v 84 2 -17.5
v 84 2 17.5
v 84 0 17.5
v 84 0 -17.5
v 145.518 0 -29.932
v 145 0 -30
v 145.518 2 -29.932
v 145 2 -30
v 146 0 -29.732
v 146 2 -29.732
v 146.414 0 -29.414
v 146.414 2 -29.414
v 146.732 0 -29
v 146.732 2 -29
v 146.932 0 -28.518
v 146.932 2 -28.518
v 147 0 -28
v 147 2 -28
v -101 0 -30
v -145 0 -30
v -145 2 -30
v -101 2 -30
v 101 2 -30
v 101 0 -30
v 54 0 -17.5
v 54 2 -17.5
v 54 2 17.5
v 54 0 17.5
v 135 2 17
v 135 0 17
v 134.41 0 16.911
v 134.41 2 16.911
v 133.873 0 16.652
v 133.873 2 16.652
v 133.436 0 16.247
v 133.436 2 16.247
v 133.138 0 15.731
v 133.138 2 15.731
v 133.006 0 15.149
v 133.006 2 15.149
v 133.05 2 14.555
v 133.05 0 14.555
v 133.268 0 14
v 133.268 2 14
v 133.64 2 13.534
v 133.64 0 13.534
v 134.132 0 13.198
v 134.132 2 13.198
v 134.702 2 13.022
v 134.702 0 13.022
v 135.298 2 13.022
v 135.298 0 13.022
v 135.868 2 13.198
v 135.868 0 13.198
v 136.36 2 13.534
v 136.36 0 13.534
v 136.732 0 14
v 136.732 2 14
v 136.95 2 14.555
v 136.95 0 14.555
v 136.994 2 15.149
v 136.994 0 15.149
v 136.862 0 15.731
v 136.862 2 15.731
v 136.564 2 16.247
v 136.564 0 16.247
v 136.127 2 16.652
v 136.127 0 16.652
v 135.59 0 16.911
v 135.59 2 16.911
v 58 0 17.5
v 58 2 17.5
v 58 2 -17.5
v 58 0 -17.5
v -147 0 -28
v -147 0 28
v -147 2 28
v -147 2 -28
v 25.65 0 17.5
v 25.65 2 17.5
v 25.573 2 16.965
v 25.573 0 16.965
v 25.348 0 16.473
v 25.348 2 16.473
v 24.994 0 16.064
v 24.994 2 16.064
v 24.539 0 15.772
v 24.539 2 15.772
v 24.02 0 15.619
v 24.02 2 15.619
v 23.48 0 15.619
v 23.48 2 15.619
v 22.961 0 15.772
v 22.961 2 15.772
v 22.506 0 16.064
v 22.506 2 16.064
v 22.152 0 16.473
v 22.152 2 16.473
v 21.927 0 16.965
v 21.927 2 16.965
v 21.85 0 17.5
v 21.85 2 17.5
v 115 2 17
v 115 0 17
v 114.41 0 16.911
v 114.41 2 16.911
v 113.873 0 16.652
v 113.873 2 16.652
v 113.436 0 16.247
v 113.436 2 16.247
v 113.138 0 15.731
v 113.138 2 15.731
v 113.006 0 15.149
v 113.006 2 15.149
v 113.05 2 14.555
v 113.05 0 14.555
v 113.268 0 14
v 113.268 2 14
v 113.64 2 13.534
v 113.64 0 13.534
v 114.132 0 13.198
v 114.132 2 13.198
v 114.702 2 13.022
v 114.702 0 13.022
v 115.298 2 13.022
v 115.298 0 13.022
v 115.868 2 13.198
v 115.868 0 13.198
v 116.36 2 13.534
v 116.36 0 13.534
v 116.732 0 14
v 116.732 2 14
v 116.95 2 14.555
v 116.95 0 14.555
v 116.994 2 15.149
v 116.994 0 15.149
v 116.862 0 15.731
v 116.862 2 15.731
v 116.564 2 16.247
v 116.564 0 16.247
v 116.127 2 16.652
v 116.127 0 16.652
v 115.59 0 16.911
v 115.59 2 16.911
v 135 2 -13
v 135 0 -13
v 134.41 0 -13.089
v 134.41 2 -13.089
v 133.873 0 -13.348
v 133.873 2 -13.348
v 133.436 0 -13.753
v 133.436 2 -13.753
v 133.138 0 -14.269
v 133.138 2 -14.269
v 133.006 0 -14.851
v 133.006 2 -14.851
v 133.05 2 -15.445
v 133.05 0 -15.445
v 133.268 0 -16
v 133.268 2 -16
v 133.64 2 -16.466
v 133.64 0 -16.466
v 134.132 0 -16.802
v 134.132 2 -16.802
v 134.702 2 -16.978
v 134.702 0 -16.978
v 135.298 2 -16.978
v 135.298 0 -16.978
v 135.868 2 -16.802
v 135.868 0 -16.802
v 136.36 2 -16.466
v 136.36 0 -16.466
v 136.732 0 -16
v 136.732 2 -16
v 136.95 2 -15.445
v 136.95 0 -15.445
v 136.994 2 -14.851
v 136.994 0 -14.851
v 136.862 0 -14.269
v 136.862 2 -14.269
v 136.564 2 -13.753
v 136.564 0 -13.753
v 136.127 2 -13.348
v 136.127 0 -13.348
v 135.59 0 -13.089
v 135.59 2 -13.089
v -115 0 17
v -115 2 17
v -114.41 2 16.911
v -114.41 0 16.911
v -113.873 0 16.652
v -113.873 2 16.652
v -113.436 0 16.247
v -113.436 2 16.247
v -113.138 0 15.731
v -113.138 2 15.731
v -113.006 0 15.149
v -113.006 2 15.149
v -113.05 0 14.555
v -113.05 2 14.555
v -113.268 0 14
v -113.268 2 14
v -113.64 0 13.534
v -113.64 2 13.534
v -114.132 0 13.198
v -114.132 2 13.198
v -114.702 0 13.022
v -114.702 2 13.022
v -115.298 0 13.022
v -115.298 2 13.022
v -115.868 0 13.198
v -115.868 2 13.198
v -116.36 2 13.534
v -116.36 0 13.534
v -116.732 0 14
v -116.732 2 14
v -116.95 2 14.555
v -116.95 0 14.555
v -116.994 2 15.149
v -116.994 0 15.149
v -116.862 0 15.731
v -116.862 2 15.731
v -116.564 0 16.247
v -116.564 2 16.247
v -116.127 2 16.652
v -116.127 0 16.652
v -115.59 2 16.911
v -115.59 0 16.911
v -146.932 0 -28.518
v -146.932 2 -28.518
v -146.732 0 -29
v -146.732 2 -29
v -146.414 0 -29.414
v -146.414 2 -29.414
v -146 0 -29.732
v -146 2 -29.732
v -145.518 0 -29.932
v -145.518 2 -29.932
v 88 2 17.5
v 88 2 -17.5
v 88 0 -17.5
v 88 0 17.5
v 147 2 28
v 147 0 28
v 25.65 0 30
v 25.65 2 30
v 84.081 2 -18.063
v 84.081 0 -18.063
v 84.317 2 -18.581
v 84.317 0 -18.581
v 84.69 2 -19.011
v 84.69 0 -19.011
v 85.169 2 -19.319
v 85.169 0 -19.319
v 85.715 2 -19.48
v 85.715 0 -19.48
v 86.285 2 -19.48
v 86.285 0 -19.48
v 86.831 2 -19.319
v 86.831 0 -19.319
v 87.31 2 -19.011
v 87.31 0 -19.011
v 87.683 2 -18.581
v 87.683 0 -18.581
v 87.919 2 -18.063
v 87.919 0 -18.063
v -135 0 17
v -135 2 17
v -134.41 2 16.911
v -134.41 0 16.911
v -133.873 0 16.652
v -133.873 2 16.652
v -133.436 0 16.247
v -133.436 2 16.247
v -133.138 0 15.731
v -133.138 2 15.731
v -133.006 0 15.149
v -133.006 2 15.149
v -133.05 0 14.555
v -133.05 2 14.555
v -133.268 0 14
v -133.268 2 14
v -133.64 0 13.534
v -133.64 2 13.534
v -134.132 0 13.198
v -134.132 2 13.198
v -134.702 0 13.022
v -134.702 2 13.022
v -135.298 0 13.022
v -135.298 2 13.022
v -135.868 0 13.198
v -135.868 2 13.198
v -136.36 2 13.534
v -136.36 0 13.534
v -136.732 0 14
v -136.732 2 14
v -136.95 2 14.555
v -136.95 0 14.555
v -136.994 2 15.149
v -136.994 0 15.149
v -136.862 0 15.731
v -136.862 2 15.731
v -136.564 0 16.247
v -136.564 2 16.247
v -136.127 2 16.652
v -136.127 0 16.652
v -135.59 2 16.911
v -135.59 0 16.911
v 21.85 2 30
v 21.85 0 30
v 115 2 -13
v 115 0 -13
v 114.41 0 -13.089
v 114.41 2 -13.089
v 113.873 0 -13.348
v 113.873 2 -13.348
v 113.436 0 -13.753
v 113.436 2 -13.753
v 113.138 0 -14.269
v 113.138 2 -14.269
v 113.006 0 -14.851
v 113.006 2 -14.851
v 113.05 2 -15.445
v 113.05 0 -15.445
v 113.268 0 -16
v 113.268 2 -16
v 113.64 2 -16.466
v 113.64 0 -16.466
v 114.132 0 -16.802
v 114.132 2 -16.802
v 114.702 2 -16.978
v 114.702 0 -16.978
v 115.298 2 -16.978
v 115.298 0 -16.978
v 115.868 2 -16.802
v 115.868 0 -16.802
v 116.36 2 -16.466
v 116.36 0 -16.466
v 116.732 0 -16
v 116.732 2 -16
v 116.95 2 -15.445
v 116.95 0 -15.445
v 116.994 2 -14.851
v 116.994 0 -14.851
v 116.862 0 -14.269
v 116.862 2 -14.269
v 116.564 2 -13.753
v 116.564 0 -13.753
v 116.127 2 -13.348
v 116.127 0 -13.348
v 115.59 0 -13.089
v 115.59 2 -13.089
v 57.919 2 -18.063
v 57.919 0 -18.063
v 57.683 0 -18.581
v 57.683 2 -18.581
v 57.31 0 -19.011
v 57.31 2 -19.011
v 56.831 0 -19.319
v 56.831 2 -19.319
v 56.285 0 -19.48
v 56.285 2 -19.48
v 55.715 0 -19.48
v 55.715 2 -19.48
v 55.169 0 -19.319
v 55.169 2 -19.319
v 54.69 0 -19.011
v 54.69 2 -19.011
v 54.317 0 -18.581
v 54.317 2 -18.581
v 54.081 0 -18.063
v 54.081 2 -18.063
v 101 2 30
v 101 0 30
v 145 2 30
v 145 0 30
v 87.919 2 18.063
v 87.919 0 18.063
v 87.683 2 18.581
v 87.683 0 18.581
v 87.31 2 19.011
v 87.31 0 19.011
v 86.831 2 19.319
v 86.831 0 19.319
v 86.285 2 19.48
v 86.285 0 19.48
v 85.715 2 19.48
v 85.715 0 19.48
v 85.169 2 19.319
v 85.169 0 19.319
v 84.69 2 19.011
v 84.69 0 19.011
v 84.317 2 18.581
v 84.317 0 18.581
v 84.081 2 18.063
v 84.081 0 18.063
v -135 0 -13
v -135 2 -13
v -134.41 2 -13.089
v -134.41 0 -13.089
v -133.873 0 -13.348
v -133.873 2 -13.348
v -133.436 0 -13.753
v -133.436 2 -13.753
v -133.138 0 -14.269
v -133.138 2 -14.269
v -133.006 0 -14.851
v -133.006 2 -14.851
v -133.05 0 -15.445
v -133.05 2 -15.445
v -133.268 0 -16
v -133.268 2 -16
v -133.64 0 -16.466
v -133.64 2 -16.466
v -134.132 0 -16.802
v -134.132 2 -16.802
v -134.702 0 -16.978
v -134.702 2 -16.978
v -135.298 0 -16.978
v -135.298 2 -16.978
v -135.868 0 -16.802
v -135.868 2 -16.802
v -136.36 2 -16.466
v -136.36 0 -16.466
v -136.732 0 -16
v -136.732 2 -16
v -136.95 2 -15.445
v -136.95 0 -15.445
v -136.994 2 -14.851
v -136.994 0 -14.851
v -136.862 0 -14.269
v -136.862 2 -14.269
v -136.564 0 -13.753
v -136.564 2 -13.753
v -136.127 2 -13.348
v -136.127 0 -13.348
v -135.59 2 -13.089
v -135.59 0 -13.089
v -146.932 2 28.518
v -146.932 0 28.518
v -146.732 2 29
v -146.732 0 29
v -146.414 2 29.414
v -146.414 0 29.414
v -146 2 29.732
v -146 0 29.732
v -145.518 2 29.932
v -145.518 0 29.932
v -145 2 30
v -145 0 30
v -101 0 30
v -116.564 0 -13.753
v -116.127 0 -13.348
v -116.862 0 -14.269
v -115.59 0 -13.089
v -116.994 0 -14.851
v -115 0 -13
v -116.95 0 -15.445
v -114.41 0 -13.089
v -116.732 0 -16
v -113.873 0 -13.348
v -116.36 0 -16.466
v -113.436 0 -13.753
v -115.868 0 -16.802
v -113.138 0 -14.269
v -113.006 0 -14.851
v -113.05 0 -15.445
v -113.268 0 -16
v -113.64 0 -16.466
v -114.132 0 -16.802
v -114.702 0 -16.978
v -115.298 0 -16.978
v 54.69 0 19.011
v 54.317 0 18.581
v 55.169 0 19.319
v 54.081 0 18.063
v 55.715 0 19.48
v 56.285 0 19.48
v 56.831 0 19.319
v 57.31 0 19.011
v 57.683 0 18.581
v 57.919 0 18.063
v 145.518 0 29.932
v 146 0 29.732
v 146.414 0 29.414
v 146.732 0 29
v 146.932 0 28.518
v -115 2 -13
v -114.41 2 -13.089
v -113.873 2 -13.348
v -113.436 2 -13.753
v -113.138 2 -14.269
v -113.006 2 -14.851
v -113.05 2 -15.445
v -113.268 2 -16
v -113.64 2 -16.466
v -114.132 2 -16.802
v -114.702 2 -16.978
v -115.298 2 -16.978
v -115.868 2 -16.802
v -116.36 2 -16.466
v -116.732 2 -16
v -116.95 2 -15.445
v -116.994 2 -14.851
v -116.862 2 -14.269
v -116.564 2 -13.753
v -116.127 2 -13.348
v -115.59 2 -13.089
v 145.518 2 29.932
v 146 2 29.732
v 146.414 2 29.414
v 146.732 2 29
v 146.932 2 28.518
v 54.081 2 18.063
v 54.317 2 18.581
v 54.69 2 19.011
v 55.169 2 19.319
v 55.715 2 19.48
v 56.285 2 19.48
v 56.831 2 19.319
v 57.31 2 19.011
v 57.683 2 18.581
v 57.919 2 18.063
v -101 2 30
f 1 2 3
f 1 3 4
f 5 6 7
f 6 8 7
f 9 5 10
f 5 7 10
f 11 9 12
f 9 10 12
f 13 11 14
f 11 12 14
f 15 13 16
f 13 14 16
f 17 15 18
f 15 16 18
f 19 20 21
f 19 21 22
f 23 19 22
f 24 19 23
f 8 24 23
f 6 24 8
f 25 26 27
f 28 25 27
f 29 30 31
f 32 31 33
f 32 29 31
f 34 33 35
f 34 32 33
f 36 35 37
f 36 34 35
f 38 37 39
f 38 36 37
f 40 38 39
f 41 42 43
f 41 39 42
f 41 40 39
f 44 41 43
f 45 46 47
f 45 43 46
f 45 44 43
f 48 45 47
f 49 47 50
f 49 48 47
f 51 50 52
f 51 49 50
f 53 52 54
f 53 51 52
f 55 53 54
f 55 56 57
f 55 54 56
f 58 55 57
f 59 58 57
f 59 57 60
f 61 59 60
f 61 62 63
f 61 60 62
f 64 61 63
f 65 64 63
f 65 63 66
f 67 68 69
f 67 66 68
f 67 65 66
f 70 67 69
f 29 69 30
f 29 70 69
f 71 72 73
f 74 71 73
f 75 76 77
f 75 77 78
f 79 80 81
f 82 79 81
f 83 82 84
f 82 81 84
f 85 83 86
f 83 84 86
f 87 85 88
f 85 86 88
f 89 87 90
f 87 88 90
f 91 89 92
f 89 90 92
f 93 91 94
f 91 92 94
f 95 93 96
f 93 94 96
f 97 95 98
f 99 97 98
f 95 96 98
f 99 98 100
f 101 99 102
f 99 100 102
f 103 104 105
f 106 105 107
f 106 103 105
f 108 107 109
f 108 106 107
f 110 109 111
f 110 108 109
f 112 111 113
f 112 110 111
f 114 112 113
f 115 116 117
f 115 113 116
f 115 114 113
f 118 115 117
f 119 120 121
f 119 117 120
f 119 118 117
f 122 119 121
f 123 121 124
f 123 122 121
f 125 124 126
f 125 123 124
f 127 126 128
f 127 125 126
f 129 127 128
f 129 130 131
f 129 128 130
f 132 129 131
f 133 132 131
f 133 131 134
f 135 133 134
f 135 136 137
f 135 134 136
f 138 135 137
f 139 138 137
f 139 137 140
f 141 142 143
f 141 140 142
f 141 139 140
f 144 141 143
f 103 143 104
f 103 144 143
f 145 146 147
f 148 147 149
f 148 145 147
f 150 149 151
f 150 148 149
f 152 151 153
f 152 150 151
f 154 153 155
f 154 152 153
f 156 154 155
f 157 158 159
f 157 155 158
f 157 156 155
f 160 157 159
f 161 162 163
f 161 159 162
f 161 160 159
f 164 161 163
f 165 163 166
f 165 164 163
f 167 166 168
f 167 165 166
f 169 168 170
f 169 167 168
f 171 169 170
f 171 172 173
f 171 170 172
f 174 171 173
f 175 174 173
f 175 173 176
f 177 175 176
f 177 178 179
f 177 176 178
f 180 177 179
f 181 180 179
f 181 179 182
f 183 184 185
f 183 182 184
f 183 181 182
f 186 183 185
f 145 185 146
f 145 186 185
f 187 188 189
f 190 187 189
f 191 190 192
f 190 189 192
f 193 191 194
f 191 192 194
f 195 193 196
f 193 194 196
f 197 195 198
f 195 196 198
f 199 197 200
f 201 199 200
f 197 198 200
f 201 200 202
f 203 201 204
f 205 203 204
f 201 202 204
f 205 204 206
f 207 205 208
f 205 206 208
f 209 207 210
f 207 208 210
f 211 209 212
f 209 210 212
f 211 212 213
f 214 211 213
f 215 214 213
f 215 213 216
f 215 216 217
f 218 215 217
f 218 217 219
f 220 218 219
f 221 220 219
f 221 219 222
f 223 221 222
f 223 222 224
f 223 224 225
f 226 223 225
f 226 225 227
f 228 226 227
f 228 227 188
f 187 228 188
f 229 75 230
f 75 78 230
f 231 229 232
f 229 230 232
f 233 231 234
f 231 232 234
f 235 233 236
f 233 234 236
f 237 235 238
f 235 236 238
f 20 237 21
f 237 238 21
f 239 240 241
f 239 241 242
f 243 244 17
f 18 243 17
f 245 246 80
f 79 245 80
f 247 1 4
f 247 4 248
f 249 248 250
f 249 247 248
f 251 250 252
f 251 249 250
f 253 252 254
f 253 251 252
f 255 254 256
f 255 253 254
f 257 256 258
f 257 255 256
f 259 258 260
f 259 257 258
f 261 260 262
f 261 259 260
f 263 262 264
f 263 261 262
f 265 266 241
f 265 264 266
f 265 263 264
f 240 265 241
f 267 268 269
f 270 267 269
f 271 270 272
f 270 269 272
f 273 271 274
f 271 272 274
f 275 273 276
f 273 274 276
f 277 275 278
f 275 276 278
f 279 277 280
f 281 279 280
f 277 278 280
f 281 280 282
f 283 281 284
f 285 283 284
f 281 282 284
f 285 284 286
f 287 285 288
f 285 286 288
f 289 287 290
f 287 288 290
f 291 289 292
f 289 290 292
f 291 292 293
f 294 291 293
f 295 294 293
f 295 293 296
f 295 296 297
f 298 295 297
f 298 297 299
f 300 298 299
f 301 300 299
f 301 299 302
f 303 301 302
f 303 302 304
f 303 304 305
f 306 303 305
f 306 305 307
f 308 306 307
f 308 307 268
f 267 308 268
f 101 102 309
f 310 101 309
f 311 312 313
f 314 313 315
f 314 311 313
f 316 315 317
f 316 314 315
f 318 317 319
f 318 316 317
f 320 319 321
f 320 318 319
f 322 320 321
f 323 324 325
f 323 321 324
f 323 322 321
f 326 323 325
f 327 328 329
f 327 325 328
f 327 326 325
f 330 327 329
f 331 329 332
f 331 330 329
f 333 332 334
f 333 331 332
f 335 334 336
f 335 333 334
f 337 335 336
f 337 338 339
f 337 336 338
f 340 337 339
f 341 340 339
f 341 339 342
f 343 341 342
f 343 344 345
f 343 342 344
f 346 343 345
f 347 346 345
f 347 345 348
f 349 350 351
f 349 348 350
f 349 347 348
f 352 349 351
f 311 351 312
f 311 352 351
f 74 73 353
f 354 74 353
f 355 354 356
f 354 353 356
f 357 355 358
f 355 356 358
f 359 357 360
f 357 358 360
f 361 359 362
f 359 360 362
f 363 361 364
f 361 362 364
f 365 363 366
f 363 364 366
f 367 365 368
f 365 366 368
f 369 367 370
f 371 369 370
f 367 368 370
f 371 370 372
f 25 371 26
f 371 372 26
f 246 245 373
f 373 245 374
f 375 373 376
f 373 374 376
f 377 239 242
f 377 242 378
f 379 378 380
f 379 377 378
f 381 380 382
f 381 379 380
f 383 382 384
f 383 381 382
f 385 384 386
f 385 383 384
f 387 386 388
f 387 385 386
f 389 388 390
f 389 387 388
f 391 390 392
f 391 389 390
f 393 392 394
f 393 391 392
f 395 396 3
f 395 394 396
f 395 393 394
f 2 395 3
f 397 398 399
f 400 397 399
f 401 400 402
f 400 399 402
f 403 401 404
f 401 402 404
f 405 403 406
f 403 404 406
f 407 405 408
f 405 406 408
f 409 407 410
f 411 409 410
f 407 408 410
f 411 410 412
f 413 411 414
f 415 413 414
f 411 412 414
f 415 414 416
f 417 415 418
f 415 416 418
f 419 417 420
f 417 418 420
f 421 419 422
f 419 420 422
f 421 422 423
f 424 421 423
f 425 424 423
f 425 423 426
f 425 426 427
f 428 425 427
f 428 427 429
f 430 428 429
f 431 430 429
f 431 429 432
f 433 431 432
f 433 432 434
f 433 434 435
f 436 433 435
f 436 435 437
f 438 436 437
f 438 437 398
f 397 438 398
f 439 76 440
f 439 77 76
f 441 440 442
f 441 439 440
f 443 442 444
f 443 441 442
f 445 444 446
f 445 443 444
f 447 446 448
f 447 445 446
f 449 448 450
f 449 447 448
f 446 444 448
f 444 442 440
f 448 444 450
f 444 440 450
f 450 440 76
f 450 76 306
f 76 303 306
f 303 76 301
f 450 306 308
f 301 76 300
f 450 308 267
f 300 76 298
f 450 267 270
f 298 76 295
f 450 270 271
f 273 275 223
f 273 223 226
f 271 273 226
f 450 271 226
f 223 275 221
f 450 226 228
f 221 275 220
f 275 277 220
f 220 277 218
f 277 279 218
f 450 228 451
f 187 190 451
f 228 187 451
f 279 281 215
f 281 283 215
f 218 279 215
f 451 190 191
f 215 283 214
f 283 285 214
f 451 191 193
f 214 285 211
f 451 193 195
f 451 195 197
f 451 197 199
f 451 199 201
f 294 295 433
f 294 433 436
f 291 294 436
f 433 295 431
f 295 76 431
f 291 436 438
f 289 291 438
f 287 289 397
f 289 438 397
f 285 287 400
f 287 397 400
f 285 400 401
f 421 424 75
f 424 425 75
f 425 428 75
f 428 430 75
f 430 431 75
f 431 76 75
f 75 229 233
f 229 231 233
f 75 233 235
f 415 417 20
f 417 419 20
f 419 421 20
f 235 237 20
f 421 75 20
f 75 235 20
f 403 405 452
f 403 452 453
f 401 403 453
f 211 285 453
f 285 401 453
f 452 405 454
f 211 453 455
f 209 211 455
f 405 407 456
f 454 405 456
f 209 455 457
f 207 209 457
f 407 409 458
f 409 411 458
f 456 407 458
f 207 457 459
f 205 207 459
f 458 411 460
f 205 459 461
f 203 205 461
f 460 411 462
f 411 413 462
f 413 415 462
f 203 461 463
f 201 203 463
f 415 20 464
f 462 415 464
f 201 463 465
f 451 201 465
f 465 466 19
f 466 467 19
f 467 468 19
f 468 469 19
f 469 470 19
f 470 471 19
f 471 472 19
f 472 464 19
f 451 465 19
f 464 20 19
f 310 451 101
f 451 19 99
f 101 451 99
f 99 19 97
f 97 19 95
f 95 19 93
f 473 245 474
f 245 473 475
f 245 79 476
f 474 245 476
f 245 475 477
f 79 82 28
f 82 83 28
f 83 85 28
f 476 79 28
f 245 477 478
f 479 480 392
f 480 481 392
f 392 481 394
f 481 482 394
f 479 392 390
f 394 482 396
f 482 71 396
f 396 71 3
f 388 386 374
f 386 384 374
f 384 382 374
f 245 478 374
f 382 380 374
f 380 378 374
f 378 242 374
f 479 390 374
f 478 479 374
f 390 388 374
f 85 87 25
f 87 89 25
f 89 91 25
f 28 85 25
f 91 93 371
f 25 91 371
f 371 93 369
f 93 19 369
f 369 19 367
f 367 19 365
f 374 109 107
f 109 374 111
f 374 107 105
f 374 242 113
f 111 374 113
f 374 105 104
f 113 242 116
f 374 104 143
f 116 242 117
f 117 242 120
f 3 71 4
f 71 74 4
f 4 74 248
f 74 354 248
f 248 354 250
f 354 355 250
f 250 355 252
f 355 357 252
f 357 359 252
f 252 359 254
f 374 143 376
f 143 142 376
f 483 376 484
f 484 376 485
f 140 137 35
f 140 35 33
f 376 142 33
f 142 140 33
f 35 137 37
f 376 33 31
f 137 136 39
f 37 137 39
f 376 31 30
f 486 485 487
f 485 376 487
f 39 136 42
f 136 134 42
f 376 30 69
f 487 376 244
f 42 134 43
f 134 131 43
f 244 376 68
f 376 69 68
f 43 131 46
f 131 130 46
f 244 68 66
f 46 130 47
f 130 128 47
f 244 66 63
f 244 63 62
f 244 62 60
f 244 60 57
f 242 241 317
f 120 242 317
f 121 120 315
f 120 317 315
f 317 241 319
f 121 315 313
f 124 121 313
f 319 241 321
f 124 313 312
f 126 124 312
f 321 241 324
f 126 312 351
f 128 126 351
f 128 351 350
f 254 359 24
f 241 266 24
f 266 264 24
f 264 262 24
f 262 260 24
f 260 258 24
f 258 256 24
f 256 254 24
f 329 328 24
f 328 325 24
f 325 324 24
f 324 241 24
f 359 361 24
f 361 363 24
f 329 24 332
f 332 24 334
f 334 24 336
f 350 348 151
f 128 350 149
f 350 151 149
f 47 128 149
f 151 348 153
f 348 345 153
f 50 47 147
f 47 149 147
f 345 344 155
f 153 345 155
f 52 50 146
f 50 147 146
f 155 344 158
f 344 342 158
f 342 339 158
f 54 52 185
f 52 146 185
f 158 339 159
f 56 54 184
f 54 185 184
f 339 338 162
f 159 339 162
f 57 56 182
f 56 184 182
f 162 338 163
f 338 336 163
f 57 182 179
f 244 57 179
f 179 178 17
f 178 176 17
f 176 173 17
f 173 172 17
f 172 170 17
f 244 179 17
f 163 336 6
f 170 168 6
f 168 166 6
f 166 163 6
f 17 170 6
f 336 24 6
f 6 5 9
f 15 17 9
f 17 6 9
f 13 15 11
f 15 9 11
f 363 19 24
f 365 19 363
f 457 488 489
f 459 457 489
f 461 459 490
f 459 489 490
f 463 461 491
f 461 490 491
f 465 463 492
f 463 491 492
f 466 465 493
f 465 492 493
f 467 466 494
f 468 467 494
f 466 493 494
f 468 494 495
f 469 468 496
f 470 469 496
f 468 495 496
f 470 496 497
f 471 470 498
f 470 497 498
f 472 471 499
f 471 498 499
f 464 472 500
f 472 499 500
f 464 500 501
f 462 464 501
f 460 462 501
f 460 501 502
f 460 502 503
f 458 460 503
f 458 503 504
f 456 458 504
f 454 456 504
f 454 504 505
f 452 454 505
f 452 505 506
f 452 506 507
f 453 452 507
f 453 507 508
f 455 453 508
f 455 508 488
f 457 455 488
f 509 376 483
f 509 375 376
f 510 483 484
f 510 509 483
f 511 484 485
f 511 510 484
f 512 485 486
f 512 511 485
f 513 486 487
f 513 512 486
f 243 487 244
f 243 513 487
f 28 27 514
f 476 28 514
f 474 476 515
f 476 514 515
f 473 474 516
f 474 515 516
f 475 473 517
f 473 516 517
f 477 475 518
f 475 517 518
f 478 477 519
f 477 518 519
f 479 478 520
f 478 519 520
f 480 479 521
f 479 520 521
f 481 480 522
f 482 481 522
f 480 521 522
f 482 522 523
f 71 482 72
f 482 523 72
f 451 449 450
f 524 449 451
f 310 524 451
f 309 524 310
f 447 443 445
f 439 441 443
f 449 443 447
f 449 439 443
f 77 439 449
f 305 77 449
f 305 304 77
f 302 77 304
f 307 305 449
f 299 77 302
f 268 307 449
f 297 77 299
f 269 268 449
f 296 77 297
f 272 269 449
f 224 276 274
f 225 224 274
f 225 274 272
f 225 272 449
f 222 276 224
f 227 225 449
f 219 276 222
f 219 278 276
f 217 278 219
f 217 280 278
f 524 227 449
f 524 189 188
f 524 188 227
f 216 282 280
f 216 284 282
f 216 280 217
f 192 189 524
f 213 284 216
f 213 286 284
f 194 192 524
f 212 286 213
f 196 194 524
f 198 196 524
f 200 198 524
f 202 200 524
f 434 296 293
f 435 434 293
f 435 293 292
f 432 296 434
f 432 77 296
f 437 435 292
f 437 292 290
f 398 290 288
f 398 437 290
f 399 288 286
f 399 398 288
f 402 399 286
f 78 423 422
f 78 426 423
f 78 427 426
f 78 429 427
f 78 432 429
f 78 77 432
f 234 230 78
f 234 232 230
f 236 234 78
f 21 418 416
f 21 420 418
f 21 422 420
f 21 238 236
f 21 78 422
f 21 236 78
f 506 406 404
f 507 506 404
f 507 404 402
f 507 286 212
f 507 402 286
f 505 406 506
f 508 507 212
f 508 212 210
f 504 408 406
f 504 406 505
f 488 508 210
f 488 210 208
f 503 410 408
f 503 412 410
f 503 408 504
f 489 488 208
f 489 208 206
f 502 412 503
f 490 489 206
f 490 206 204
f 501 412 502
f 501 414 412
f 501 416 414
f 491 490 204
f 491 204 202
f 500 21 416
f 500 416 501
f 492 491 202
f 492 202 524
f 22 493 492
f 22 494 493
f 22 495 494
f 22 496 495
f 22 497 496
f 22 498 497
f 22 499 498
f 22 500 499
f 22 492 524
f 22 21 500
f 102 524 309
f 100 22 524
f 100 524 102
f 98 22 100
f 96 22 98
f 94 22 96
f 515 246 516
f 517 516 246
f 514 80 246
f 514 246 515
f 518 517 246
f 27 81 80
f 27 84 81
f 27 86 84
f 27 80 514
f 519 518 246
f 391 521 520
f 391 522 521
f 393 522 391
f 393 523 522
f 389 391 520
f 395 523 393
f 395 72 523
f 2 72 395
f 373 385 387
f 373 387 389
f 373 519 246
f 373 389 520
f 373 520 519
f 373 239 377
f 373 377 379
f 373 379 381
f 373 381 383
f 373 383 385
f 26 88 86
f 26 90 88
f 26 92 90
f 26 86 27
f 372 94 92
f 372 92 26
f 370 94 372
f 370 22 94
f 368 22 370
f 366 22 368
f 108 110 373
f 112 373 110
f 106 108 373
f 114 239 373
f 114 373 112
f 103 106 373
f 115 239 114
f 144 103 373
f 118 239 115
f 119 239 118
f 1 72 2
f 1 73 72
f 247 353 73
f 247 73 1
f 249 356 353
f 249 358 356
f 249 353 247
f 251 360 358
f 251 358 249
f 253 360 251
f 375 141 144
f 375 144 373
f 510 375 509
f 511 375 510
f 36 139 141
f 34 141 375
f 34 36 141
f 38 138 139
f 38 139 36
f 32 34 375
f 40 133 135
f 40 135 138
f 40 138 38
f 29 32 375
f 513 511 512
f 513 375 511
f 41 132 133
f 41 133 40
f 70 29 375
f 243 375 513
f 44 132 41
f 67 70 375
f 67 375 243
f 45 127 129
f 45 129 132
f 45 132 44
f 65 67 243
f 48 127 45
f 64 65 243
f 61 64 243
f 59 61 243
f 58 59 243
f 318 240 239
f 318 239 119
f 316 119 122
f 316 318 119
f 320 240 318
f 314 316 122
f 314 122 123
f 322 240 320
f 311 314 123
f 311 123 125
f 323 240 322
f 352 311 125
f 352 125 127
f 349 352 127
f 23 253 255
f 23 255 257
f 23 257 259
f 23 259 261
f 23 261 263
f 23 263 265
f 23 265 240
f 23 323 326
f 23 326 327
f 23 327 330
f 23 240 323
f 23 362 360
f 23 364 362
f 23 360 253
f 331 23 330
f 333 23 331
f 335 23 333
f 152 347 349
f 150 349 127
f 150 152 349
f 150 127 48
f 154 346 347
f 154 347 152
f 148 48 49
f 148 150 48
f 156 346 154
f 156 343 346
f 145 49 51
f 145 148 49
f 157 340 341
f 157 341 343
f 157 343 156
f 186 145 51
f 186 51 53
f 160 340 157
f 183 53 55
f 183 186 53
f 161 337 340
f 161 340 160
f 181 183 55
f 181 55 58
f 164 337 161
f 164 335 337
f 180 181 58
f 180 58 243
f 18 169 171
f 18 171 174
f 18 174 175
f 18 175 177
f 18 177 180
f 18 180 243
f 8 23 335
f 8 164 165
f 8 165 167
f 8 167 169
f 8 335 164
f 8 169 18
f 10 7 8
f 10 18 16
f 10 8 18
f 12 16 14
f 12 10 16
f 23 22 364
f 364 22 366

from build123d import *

# Parameters (mm, degrees)
SKETCH1_W           = 47
SKETCH1_H           = 60
SKETCH1_W_2         = 140
SKETCH1_H_2         = 140
BOSS_EXTRUDE1_DEPTH = 2
SKETCH2_R           = 2
CUT_EXTRUDE1_DEPTH  = 10
CUT_EXTRUDE3_DEPTH  = 10
FILLET1_R           = 2
SKETCH12_W          = 218.916263912
SKETCH12_H          = 42.811459275
SKETCH12_H_2        = 41.263513939
CUT_EXTRUDE4_DEPTH  = 10


with BuildPart() as part:
    # Sketch1 → Boss-Extrude1 (new body)
    with BuildSketch(Plane(origin=(0, 0, 0), x_dir=(1, 0, 0), z_dir=(0, 1, 0))):
        with Locations((-123.5, 0)):
            Rectangle(SKETCH1_W, SKETCH1_H)
        Polygon((-100, 30), (-100, -30), (-70, -70), (-70, 70), align=None)
        Rectangle(SKETCH1_W_2, SKETCH1_H_2)
        Polygon((100, 30), (100, -30), (70, -70), (70, 70), align=None)
        with Locations((123.5, 0)):
            Rectangle(SKETCH1_W, SKETCH1_H)
    extrude(amount=BOSS_EXTRUDE1_DEPTH)

    # Sketch2 → Cut-Extrude1 (cut)
    with BuildSketch(Plane(origin=(0, 2, 0), x_dir=(1, 0, 0), z_dir=(0, 1, 0))):
        with Locations(Location((-135, 15, 0), (0, 0, 270))):
            Circle(SKETCH2_R)
        with Locations(Location((-115, 15, 0), (0, 0, 270))):
            Circle(SKETCH2_R)
        with Locations(Location((-135, -15, 0), (0, 0, 270))):
            Circle(SKETCH2_R)
        with Locations(Location((-115, -15, 0), (0, 0, 270))):
            Circle(SKETCH2_R)
    cut_extrude1 = extrude(amount=-CUT_EXTRUDE1_DEPTH, mode=Mode.SUBTRACT)

    # Mirror1: Cut-Extrude1 across plane
    add(cut_extrude1.mirror(Plane(origin=(0, 0, 0), x_dir=(0, 0, 1), z_dir=(1, 0, 0))), mode=Mode.SUBTRACT)

    # Sketch11 → Cut-Extrude3 (cut)
    with BuildSketch(Plane(origin=(0, 2, 0), x_dir=(1, 0, 0), z_dir=(0, 1, 0))):
        with BuildLine():
            Line((58, -17.5), (58, 17.5))
            ThreePointArc((58, 17.5), (56, 19.5), (54, 17.5))
            Line((54, 17.5), (54, -17.5))
            ThreePointArc((54, -17.5), (56, -19.5), (58, -17.5))
        make_face()
        with BuildLine():
            Line((84, -17.5), (84, 17.5))
            ThreePointArc((84, 17.5), (86, 19.5), (88, 17.5))
            Line((88, 17.5), (88, -17.5))
            ThreePointArc((88, -17.5), (86, -19.5), (84, -17.5))
        make_face()
        with BuildLine():
            Line((21.85, -17.5), (21.85, -47.5))
            ThreePointArc((21.85, -47.5), (23.75, -49.4), (25.65, -47.5))
            Line((25.65, -47.5), (25.65, -17.5))
            ThreePointArc((25.65, -17.5), (23.75, -15.6), (21.85, -17.5))
        make_face()
    extrude(amount=-CUT_EXTRUDE3_DEPTH, mode=Mode.SUBTRACT)

    # Fillet1
    fillet1_edges = [part.edges().sort_by_distance(p)[0] for p in [
        (-147, 1, 30),
        (-147, 1, -30),
        (-100, 1, -30),
        (-70, 1, -70),
        (70, 1, -70),
        (100, 1, -30),
        (147, 1, -30),
        (147, 1, 30),
        (100, 1, 30),
        (70, 1, 70),
        (-70, 1, 70),
        (-100, 1, 30),
    ]]
    fillet(fillet1_edges, radius=FILLET1_R)

    # Sketch12 → Cut-Extrude4 (cut)
    with BuildSketch(Plane(origin=(0, 2, 0), x_dir=(1, 0, 0), z_dir=(0, 1, 0))):
        with Locations((-2.238018123, 51.405729638)):
            Rectangle(SKETCH12_W, SKETCH12_H)
        with Locations((-2.238018123, -50.63175697)):
            Rectangle(SKETCH12_W, SKETCH12_H_2)
    extrude(amount=-CUT_EXTRUDE4_DEPTH, mode=Mode.SUBTRACT)


solid = part.part
